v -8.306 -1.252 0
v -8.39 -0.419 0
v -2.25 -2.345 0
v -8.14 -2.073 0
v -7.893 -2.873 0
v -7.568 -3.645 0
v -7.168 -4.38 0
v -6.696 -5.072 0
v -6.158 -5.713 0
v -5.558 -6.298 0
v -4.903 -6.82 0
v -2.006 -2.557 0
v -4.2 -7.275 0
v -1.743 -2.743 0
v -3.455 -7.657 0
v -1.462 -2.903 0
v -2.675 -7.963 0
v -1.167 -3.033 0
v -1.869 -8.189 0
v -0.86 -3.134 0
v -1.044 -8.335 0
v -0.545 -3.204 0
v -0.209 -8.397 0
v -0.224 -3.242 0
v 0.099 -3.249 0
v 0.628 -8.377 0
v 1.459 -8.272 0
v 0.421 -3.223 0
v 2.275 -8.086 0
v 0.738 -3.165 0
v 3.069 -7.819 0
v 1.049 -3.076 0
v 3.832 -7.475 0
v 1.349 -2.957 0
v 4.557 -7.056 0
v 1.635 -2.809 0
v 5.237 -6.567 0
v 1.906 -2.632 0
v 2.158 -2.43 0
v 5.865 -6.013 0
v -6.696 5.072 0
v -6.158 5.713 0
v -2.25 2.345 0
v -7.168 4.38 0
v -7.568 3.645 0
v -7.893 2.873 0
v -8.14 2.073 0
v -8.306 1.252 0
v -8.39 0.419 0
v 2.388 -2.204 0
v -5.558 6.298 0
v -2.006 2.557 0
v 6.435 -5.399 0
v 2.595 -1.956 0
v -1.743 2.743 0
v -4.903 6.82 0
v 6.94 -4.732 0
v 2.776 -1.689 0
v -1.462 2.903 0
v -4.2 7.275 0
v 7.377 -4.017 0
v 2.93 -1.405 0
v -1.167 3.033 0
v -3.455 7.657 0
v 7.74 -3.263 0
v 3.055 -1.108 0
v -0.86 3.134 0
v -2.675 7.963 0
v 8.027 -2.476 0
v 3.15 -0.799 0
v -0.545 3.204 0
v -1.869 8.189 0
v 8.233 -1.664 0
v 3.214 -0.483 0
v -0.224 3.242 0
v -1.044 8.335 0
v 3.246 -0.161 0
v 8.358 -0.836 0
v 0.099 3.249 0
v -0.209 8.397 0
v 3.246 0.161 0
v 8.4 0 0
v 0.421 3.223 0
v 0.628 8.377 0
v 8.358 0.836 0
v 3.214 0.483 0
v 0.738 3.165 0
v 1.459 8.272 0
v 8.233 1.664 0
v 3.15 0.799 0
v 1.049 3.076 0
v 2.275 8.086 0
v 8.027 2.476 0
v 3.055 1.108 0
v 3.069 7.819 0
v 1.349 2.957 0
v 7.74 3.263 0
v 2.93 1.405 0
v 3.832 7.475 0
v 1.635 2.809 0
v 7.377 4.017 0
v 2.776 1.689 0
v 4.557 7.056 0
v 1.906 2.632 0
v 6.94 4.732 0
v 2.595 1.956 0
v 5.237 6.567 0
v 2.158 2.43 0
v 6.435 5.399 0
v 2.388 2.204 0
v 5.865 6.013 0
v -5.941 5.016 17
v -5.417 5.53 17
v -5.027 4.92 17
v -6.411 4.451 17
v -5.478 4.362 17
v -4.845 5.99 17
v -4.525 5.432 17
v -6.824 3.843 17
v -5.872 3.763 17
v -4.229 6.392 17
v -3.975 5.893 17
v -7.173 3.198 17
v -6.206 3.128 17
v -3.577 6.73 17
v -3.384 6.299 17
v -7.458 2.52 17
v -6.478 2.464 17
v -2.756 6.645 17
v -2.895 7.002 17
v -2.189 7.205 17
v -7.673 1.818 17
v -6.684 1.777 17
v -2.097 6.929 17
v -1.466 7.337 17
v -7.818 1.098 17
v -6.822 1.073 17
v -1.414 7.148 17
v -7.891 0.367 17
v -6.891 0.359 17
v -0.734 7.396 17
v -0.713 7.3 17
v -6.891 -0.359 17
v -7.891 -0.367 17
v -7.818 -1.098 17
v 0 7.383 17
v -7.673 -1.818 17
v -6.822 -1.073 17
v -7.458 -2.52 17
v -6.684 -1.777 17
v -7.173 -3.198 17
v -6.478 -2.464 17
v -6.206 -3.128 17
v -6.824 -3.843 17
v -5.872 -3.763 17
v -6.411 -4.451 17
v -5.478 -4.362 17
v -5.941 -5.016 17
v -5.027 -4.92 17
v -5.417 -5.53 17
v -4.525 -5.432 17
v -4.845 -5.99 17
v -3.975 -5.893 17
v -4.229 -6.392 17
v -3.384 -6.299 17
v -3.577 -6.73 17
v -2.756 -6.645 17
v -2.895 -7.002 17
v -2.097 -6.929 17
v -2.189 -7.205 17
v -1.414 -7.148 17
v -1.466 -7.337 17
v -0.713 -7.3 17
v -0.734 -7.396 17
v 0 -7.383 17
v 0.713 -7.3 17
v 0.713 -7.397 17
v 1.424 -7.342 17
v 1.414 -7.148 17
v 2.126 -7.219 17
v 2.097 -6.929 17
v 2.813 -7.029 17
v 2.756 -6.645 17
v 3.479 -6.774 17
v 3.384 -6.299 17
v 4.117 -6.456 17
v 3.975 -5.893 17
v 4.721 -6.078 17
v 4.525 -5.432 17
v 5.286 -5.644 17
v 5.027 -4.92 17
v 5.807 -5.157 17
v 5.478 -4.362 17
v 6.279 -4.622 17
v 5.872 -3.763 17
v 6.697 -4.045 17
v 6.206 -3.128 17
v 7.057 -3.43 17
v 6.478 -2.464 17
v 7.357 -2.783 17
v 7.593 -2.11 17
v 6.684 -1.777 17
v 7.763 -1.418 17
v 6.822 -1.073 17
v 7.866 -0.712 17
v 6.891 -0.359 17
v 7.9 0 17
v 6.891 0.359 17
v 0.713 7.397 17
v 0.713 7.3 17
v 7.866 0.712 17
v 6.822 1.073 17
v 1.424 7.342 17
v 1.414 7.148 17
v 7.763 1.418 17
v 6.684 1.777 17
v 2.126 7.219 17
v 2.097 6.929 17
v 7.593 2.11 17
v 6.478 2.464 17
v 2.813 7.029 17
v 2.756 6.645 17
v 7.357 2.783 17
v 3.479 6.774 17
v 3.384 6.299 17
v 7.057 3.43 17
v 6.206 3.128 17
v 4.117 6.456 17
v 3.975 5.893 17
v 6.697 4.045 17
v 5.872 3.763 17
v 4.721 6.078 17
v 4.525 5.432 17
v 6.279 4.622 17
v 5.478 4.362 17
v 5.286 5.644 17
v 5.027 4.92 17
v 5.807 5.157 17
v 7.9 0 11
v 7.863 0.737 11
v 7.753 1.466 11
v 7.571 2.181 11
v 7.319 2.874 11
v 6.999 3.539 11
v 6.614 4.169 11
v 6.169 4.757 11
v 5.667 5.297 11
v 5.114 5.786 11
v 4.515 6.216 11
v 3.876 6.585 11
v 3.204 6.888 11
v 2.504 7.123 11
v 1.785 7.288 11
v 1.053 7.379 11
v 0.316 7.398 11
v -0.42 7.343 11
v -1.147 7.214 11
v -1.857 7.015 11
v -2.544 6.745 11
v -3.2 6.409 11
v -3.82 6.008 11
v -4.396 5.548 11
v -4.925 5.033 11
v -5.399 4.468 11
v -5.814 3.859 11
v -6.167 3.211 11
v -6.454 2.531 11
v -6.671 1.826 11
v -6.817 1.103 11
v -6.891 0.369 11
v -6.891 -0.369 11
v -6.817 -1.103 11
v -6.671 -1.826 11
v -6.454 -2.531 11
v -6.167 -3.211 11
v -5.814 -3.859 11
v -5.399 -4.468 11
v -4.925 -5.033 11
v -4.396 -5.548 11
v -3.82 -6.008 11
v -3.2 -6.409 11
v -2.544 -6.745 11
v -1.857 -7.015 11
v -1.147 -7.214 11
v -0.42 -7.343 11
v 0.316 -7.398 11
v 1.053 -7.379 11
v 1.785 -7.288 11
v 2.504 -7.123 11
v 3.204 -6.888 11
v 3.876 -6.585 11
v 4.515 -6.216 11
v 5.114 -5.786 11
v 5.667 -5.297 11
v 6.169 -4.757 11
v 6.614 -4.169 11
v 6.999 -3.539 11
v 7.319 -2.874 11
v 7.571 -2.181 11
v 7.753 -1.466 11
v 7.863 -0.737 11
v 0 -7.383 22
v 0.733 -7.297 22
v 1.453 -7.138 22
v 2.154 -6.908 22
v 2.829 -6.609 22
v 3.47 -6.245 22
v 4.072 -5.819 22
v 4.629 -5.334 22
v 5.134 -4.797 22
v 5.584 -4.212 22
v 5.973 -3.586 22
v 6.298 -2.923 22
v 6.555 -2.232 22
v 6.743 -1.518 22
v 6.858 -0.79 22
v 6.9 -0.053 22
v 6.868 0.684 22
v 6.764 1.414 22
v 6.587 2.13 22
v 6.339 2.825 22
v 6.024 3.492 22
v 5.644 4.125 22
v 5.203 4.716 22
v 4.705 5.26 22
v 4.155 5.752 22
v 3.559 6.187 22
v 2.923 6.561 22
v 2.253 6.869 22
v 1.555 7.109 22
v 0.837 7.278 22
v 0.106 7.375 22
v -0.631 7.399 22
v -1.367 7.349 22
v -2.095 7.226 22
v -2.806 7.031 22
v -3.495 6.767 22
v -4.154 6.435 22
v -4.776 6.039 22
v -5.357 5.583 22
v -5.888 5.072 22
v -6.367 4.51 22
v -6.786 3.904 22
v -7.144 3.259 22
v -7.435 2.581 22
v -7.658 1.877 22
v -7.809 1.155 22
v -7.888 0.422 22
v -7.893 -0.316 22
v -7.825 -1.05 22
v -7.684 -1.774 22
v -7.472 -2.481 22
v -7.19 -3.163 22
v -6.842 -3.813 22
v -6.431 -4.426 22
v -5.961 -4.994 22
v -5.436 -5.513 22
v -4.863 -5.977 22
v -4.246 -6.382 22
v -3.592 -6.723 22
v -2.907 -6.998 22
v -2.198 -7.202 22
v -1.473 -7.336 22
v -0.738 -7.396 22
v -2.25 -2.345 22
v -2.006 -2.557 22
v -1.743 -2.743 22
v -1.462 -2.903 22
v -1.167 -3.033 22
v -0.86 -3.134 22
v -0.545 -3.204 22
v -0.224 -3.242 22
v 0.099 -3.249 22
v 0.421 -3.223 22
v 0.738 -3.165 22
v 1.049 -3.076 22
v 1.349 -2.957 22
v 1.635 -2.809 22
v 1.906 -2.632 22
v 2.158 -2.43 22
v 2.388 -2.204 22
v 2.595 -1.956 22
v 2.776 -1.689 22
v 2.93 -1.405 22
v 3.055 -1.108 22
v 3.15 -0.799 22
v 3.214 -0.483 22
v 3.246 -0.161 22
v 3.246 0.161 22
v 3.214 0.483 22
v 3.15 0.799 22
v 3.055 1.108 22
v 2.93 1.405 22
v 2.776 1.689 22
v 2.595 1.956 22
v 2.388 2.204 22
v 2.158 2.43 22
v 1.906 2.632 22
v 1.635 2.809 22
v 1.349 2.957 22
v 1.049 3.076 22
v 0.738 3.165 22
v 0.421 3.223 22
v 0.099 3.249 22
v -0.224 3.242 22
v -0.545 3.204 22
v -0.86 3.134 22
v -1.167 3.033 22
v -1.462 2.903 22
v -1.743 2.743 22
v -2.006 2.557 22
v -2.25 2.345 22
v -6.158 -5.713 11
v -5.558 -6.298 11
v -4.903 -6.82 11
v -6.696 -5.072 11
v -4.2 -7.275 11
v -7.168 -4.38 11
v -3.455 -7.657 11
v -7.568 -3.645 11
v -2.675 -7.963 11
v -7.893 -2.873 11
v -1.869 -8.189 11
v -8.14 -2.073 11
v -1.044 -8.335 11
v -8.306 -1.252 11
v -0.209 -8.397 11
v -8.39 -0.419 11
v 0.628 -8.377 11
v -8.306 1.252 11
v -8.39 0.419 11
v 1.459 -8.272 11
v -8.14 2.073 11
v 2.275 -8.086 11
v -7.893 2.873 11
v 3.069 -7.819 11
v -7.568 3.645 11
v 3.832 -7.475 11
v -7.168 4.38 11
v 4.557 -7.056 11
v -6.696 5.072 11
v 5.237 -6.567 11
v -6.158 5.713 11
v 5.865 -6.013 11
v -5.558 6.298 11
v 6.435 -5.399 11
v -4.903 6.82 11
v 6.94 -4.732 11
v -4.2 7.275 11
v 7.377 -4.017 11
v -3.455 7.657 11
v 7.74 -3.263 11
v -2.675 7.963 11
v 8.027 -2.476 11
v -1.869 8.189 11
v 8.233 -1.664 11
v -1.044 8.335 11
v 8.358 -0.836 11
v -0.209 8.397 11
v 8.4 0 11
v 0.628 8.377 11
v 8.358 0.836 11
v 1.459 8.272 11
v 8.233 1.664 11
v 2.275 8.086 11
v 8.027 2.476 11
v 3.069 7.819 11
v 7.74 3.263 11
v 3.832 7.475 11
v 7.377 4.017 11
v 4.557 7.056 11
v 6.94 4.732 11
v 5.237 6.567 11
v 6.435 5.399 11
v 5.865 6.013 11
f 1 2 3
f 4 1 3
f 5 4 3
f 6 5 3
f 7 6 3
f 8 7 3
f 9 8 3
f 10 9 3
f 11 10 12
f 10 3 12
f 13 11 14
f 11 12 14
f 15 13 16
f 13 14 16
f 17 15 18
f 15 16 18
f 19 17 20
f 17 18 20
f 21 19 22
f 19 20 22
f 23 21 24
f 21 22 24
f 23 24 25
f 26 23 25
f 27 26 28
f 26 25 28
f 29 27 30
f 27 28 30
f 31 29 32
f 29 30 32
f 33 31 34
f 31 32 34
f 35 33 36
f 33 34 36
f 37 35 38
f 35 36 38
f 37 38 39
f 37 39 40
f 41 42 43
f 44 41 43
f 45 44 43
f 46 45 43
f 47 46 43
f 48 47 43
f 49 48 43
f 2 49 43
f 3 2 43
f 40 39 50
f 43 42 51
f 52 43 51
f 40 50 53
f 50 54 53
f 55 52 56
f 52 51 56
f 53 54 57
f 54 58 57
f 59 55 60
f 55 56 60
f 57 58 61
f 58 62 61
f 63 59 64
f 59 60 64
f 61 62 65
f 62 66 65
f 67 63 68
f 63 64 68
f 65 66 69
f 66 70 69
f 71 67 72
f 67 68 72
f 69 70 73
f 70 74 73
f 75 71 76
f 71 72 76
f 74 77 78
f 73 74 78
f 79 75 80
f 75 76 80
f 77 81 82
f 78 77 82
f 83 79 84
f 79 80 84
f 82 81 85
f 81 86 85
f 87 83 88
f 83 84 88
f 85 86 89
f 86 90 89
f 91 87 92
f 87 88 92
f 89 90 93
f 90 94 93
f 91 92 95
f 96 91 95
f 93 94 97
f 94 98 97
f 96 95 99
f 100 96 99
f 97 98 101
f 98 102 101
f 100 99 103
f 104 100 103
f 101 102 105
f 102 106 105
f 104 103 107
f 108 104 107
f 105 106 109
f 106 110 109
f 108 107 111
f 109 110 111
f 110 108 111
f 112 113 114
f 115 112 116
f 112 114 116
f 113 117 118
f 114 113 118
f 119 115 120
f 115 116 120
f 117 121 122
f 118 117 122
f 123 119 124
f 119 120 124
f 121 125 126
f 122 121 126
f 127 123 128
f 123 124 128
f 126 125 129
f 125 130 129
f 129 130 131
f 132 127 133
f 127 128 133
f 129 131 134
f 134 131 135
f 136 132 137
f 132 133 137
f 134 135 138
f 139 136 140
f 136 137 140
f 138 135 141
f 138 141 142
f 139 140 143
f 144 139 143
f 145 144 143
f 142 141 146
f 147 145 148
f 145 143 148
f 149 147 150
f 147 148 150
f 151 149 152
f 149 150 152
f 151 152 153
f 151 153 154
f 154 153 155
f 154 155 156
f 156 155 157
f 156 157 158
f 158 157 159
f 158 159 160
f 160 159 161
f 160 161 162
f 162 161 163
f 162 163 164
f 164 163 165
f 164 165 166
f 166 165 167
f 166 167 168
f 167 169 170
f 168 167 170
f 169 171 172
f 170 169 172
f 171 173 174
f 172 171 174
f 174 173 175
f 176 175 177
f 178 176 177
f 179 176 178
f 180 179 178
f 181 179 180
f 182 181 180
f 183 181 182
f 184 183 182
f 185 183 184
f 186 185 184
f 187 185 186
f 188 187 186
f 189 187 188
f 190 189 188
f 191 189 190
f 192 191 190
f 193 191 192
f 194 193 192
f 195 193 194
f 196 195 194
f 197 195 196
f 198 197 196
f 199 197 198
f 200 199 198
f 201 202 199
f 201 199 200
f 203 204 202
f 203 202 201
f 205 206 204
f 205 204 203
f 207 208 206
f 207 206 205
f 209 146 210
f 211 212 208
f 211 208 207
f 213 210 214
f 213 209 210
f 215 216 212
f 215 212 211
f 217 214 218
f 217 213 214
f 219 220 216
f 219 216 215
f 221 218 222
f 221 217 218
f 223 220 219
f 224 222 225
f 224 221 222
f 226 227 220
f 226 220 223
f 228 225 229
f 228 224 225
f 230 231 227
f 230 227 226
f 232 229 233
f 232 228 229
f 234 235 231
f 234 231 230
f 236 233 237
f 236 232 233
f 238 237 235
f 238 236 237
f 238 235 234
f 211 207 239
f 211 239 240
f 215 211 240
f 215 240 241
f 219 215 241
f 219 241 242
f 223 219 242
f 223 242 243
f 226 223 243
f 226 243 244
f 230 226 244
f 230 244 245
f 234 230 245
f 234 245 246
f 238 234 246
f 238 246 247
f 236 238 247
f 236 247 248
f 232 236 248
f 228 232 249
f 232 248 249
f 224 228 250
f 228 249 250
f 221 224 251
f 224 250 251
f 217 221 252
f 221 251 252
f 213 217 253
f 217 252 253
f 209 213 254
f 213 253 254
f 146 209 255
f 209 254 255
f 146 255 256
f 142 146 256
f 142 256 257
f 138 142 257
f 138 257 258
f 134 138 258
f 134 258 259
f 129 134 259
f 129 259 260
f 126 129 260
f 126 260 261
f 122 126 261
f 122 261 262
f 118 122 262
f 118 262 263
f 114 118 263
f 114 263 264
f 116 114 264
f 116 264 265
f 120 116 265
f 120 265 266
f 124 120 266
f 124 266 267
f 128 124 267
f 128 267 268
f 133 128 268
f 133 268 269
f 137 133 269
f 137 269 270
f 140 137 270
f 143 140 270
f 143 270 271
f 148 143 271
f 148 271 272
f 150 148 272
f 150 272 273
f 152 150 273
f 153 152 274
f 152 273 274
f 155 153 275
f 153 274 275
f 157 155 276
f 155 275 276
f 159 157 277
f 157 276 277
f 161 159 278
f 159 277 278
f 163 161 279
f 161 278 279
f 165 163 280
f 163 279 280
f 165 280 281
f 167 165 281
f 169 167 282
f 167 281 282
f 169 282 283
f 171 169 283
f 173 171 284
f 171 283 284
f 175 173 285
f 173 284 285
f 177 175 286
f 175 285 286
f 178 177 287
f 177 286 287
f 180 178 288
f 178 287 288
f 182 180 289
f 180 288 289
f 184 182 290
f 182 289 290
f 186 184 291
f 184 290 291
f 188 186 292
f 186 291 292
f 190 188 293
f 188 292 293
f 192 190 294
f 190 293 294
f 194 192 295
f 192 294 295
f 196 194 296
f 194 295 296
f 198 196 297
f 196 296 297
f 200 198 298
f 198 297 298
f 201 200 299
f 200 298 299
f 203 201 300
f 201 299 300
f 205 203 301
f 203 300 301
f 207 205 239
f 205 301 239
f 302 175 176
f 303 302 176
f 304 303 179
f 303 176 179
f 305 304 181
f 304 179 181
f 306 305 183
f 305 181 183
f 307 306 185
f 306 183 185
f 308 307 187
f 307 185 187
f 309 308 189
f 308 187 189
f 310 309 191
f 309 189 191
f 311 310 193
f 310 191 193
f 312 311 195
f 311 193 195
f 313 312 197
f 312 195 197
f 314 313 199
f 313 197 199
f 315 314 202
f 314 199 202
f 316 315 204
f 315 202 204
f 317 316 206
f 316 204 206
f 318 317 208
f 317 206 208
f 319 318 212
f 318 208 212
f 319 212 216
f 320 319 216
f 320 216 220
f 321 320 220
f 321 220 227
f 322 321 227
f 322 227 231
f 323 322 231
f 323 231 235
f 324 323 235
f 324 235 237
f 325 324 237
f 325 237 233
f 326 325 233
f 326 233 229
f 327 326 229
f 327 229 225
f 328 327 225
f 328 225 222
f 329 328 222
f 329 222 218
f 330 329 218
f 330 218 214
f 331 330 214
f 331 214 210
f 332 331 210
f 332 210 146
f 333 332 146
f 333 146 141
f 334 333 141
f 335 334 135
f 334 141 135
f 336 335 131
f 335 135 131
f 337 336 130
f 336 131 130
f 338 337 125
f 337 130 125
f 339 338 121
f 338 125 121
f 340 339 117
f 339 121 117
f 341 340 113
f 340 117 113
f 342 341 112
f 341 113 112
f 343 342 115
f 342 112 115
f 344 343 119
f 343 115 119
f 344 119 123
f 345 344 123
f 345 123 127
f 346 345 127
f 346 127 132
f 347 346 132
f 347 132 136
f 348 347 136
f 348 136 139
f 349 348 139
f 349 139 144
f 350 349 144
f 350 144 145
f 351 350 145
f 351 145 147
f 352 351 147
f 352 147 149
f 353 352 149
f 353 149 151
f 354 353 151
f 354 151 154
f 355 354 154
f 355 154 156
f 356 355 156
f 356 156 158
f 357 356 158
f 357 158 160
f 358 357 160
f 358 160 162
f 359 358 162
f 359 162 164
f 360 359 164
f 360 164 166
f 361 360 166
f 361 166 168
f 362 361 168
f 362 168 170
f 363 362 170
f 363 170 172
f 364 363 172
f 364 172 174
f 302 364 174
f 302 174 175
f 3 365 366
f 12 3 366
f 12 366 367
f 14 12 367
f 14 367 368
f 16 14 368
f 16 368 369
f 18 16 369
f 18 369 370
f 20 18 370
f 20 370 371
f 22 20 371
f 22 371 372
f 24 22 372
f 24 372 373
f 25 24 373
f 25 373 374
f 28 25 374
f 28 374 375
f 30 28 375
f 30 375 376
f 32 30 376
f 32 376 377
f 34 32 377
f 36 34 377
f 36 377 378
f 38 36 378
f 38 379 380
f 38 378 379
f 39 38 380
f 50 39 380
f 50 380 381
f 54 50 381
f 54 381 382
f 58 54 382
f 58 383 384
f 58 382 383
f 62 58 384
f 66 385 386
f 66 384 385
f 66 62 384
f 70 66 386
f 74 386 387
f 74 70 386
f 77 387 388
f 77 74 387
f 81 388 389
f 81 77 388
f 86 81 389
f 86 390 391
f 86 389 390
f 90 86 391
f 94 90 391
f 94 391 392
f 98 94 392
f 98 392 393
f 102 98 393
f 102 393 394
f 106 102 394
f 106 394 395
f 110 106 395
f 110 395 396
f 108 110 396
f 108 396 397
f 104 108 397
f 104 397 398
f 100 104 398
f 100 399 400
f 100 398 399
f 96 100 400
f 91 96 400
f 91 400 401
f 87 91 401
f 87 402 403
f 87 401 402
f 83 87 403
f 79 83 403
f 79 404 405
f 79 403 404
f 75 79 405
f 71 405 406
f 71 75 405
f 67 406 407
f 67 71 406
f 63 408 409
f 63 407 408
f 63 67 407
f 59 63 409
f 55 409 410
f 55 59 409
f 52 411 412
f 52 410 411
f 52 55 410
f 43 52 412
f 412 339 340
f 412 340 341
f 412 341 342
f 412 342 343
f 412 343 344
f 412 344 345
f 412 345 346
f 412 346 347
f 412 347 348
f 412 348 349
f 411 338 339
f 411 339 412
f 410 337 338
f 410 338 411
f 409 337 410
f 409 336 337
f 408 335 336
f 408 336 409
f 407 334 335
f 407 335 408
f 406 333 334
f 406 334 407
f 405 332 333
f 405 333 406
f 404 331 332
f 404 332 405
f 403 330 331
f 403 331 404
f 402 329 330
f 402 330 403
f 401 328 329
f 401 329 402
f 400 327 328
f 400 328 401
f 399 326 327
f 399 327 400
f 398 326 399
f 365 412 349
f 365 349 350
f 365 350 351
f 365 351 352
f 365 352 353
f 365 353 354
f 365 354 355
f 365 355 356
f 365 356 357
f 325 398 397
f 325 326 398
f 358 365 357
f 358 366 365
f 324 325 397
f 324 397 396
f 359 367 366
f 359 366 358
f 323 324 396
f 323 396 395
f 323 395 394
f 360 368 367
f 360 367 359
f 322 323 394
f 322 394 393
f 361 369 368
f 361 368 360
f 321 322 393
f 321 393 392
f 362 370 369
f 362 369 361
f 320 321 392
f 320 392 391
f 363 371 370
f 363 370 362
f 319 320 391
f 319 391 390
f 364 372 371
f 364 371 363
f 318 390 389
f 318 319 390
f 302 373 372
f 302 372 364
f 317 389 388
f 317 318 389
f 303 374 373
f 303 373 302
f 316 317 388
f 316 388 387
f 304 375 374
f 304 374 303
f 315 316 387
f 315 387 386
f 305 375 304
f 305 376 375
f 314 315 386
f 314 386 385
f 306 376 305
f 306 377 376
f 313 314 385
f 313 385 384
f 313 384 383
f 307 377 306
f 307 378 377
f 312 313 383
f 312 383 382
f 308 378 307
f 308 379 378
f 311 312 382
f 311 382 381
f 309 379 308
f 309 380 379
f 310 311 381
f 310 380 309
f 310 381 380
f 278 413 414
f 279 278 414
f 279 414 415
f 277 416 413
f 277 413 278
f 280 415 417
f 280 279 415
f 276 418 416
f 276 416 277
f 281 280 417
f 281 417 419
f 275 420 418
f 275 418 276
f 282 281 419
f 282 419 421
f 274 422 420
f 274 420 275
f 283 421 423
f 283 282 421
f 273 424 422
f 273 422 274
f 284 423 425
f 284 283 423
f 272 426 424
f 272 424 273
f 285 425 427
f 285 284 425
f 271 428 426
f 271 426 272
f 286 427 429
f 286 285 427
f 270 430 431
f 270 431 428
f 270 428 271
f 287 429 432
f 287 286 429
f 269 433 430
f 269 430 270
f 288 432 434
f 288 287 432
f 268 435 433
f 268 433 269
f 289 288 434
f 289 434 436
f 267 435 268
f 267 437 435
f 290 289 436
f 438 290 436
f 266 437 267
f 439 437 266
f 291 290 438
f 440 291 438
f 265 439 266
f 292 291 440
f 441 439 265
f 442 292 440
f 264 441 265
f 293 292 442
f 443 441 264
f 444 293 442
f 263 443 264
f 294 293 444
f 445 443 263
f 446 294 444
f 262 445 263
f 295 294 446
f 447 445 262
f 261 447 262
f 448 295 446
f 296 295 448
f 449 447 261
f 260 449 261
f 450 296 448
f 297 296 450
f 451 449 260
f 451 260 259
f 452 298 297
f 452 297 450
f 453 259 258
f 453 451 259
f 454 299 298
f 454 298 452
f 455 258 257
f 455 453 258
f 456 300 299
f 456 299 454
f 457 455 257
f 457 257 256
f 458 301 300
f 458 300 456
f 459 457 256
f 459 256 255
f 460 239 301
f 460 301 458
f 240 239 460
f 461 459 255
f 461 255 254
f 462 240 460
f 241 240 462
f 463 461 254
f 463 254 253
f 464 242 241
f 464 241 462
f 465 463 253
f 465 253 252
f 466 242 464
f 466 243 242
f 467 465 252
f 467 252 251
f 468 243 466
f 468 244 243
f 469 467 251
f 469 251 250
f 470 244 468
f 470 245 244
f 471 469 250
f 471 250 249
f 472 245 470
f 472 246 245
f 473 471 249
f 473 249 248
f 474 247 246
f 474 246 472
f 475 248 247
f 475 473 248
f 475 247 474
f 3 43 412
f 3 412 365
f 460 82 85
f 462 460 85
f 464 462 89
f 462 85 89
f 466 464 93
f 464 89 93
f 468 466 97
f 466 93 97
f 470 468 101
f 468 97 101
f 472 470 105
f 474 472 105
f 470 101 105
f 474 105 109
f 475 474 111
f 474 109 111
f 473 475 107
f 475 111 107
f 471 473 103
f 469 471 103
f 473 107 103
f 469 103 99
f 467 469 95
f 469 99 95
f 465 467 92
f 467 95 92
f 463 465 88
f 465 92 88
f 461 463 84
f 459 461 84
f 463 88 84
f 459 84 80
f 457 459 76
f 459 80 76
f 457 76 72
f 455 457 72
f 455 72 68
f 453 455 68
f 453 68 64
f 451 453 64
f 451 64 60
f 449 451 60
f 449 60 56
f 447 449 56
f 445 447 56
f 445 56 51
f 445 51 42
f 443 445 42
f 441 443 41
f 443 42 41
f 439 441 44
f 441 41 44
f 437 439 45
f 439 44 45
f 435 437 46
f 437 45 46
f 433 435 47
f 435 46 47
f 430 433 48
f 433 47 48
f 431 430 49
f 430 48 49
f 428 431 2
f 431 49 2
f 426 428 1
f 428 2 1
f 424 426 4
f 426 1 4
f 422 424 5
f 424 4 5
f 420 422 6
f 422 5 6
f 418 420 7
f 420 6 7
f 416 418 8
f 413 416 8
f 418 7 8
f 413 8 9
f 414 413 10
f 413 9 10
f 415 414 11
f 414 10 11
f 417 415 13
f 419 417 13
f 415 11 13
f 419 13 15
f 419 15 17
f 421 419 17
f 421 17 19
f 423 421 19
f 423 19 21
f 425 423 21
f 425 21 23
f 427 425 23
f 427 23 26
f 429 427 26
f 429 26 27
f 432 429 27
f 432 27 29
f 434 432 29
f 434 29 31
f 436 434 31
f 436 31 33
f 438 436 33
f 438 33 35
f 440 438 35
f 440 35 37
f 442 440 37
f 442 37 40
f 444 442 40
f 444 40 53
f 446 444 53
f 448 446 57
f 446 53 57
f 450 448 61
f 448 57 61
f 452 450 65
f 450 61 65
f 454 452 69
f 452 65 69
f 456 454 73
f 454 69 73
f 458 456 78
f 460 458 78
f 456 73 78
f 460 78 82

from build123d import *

# Parameters (mm, degrees)
ESQUISSE1_R             = 8.4
BOSS_EXTRU_1_DEPTH      = 11
ESQUISSE3_R             = 7.4
BOSS_EXTRU_2_DEPTH      = 6
ESQUISSE4_R             = 7.4
BOSS_EXTRU_3_DEPTH      = 5
ENL_V_MAT_EXTRU_1_DEPTH = 26.002399885


with BuildPart() as part:
    # Esquisse1 → Boss.-Extru.1 (new body)
    with BuildSketch(Plane.XY):
        Circle(ESQUISSE1_R)
    extrude(amount=BOSS_EXTRU_1_DEPTH)

    # Esquisse3 → Boss.-Extru.2 (add)
    with BuildSketch(Plane.XY.offset(11)):
        with Locations((0.5, 0)):
            Circle(ESQUISSE3_R)
    extrude(amount=BOSS_EXTRU_2_DEPTH)

    # Esquisse4 → Boss.-Extru.3 (add)
    with BuildSketch(Plane.XY.offset(17)):
        with Locations(Location((-0.5, 0, 0), (0, 0, 273.874288206))):
            Circle(ESQUISSE4_R)
    extrude(amount=BOSS_EXTRU_3_DEPTH)

    # Esquisse5 → Enlèv. mat.-Extru.1 (cut, through all)
    with BuildSketch(Plane(origin=(0, 0, 0), x_dir=(-1, 0, 0), z_dir=(0, 0, -1))):
        with BuildLine():
            Line((2.25, 2.34520788), (2.25, -2.34520788))
            ThreePointArc((2.25, -2.34520788), (-3.25, 0), (2.25, 2.34520788))
        make_face()
    extrude(amount=-ENL_V_MAT_EXTRU_1_DEPTH, mode=Mode.SUBTRACT)


solid = part.part
